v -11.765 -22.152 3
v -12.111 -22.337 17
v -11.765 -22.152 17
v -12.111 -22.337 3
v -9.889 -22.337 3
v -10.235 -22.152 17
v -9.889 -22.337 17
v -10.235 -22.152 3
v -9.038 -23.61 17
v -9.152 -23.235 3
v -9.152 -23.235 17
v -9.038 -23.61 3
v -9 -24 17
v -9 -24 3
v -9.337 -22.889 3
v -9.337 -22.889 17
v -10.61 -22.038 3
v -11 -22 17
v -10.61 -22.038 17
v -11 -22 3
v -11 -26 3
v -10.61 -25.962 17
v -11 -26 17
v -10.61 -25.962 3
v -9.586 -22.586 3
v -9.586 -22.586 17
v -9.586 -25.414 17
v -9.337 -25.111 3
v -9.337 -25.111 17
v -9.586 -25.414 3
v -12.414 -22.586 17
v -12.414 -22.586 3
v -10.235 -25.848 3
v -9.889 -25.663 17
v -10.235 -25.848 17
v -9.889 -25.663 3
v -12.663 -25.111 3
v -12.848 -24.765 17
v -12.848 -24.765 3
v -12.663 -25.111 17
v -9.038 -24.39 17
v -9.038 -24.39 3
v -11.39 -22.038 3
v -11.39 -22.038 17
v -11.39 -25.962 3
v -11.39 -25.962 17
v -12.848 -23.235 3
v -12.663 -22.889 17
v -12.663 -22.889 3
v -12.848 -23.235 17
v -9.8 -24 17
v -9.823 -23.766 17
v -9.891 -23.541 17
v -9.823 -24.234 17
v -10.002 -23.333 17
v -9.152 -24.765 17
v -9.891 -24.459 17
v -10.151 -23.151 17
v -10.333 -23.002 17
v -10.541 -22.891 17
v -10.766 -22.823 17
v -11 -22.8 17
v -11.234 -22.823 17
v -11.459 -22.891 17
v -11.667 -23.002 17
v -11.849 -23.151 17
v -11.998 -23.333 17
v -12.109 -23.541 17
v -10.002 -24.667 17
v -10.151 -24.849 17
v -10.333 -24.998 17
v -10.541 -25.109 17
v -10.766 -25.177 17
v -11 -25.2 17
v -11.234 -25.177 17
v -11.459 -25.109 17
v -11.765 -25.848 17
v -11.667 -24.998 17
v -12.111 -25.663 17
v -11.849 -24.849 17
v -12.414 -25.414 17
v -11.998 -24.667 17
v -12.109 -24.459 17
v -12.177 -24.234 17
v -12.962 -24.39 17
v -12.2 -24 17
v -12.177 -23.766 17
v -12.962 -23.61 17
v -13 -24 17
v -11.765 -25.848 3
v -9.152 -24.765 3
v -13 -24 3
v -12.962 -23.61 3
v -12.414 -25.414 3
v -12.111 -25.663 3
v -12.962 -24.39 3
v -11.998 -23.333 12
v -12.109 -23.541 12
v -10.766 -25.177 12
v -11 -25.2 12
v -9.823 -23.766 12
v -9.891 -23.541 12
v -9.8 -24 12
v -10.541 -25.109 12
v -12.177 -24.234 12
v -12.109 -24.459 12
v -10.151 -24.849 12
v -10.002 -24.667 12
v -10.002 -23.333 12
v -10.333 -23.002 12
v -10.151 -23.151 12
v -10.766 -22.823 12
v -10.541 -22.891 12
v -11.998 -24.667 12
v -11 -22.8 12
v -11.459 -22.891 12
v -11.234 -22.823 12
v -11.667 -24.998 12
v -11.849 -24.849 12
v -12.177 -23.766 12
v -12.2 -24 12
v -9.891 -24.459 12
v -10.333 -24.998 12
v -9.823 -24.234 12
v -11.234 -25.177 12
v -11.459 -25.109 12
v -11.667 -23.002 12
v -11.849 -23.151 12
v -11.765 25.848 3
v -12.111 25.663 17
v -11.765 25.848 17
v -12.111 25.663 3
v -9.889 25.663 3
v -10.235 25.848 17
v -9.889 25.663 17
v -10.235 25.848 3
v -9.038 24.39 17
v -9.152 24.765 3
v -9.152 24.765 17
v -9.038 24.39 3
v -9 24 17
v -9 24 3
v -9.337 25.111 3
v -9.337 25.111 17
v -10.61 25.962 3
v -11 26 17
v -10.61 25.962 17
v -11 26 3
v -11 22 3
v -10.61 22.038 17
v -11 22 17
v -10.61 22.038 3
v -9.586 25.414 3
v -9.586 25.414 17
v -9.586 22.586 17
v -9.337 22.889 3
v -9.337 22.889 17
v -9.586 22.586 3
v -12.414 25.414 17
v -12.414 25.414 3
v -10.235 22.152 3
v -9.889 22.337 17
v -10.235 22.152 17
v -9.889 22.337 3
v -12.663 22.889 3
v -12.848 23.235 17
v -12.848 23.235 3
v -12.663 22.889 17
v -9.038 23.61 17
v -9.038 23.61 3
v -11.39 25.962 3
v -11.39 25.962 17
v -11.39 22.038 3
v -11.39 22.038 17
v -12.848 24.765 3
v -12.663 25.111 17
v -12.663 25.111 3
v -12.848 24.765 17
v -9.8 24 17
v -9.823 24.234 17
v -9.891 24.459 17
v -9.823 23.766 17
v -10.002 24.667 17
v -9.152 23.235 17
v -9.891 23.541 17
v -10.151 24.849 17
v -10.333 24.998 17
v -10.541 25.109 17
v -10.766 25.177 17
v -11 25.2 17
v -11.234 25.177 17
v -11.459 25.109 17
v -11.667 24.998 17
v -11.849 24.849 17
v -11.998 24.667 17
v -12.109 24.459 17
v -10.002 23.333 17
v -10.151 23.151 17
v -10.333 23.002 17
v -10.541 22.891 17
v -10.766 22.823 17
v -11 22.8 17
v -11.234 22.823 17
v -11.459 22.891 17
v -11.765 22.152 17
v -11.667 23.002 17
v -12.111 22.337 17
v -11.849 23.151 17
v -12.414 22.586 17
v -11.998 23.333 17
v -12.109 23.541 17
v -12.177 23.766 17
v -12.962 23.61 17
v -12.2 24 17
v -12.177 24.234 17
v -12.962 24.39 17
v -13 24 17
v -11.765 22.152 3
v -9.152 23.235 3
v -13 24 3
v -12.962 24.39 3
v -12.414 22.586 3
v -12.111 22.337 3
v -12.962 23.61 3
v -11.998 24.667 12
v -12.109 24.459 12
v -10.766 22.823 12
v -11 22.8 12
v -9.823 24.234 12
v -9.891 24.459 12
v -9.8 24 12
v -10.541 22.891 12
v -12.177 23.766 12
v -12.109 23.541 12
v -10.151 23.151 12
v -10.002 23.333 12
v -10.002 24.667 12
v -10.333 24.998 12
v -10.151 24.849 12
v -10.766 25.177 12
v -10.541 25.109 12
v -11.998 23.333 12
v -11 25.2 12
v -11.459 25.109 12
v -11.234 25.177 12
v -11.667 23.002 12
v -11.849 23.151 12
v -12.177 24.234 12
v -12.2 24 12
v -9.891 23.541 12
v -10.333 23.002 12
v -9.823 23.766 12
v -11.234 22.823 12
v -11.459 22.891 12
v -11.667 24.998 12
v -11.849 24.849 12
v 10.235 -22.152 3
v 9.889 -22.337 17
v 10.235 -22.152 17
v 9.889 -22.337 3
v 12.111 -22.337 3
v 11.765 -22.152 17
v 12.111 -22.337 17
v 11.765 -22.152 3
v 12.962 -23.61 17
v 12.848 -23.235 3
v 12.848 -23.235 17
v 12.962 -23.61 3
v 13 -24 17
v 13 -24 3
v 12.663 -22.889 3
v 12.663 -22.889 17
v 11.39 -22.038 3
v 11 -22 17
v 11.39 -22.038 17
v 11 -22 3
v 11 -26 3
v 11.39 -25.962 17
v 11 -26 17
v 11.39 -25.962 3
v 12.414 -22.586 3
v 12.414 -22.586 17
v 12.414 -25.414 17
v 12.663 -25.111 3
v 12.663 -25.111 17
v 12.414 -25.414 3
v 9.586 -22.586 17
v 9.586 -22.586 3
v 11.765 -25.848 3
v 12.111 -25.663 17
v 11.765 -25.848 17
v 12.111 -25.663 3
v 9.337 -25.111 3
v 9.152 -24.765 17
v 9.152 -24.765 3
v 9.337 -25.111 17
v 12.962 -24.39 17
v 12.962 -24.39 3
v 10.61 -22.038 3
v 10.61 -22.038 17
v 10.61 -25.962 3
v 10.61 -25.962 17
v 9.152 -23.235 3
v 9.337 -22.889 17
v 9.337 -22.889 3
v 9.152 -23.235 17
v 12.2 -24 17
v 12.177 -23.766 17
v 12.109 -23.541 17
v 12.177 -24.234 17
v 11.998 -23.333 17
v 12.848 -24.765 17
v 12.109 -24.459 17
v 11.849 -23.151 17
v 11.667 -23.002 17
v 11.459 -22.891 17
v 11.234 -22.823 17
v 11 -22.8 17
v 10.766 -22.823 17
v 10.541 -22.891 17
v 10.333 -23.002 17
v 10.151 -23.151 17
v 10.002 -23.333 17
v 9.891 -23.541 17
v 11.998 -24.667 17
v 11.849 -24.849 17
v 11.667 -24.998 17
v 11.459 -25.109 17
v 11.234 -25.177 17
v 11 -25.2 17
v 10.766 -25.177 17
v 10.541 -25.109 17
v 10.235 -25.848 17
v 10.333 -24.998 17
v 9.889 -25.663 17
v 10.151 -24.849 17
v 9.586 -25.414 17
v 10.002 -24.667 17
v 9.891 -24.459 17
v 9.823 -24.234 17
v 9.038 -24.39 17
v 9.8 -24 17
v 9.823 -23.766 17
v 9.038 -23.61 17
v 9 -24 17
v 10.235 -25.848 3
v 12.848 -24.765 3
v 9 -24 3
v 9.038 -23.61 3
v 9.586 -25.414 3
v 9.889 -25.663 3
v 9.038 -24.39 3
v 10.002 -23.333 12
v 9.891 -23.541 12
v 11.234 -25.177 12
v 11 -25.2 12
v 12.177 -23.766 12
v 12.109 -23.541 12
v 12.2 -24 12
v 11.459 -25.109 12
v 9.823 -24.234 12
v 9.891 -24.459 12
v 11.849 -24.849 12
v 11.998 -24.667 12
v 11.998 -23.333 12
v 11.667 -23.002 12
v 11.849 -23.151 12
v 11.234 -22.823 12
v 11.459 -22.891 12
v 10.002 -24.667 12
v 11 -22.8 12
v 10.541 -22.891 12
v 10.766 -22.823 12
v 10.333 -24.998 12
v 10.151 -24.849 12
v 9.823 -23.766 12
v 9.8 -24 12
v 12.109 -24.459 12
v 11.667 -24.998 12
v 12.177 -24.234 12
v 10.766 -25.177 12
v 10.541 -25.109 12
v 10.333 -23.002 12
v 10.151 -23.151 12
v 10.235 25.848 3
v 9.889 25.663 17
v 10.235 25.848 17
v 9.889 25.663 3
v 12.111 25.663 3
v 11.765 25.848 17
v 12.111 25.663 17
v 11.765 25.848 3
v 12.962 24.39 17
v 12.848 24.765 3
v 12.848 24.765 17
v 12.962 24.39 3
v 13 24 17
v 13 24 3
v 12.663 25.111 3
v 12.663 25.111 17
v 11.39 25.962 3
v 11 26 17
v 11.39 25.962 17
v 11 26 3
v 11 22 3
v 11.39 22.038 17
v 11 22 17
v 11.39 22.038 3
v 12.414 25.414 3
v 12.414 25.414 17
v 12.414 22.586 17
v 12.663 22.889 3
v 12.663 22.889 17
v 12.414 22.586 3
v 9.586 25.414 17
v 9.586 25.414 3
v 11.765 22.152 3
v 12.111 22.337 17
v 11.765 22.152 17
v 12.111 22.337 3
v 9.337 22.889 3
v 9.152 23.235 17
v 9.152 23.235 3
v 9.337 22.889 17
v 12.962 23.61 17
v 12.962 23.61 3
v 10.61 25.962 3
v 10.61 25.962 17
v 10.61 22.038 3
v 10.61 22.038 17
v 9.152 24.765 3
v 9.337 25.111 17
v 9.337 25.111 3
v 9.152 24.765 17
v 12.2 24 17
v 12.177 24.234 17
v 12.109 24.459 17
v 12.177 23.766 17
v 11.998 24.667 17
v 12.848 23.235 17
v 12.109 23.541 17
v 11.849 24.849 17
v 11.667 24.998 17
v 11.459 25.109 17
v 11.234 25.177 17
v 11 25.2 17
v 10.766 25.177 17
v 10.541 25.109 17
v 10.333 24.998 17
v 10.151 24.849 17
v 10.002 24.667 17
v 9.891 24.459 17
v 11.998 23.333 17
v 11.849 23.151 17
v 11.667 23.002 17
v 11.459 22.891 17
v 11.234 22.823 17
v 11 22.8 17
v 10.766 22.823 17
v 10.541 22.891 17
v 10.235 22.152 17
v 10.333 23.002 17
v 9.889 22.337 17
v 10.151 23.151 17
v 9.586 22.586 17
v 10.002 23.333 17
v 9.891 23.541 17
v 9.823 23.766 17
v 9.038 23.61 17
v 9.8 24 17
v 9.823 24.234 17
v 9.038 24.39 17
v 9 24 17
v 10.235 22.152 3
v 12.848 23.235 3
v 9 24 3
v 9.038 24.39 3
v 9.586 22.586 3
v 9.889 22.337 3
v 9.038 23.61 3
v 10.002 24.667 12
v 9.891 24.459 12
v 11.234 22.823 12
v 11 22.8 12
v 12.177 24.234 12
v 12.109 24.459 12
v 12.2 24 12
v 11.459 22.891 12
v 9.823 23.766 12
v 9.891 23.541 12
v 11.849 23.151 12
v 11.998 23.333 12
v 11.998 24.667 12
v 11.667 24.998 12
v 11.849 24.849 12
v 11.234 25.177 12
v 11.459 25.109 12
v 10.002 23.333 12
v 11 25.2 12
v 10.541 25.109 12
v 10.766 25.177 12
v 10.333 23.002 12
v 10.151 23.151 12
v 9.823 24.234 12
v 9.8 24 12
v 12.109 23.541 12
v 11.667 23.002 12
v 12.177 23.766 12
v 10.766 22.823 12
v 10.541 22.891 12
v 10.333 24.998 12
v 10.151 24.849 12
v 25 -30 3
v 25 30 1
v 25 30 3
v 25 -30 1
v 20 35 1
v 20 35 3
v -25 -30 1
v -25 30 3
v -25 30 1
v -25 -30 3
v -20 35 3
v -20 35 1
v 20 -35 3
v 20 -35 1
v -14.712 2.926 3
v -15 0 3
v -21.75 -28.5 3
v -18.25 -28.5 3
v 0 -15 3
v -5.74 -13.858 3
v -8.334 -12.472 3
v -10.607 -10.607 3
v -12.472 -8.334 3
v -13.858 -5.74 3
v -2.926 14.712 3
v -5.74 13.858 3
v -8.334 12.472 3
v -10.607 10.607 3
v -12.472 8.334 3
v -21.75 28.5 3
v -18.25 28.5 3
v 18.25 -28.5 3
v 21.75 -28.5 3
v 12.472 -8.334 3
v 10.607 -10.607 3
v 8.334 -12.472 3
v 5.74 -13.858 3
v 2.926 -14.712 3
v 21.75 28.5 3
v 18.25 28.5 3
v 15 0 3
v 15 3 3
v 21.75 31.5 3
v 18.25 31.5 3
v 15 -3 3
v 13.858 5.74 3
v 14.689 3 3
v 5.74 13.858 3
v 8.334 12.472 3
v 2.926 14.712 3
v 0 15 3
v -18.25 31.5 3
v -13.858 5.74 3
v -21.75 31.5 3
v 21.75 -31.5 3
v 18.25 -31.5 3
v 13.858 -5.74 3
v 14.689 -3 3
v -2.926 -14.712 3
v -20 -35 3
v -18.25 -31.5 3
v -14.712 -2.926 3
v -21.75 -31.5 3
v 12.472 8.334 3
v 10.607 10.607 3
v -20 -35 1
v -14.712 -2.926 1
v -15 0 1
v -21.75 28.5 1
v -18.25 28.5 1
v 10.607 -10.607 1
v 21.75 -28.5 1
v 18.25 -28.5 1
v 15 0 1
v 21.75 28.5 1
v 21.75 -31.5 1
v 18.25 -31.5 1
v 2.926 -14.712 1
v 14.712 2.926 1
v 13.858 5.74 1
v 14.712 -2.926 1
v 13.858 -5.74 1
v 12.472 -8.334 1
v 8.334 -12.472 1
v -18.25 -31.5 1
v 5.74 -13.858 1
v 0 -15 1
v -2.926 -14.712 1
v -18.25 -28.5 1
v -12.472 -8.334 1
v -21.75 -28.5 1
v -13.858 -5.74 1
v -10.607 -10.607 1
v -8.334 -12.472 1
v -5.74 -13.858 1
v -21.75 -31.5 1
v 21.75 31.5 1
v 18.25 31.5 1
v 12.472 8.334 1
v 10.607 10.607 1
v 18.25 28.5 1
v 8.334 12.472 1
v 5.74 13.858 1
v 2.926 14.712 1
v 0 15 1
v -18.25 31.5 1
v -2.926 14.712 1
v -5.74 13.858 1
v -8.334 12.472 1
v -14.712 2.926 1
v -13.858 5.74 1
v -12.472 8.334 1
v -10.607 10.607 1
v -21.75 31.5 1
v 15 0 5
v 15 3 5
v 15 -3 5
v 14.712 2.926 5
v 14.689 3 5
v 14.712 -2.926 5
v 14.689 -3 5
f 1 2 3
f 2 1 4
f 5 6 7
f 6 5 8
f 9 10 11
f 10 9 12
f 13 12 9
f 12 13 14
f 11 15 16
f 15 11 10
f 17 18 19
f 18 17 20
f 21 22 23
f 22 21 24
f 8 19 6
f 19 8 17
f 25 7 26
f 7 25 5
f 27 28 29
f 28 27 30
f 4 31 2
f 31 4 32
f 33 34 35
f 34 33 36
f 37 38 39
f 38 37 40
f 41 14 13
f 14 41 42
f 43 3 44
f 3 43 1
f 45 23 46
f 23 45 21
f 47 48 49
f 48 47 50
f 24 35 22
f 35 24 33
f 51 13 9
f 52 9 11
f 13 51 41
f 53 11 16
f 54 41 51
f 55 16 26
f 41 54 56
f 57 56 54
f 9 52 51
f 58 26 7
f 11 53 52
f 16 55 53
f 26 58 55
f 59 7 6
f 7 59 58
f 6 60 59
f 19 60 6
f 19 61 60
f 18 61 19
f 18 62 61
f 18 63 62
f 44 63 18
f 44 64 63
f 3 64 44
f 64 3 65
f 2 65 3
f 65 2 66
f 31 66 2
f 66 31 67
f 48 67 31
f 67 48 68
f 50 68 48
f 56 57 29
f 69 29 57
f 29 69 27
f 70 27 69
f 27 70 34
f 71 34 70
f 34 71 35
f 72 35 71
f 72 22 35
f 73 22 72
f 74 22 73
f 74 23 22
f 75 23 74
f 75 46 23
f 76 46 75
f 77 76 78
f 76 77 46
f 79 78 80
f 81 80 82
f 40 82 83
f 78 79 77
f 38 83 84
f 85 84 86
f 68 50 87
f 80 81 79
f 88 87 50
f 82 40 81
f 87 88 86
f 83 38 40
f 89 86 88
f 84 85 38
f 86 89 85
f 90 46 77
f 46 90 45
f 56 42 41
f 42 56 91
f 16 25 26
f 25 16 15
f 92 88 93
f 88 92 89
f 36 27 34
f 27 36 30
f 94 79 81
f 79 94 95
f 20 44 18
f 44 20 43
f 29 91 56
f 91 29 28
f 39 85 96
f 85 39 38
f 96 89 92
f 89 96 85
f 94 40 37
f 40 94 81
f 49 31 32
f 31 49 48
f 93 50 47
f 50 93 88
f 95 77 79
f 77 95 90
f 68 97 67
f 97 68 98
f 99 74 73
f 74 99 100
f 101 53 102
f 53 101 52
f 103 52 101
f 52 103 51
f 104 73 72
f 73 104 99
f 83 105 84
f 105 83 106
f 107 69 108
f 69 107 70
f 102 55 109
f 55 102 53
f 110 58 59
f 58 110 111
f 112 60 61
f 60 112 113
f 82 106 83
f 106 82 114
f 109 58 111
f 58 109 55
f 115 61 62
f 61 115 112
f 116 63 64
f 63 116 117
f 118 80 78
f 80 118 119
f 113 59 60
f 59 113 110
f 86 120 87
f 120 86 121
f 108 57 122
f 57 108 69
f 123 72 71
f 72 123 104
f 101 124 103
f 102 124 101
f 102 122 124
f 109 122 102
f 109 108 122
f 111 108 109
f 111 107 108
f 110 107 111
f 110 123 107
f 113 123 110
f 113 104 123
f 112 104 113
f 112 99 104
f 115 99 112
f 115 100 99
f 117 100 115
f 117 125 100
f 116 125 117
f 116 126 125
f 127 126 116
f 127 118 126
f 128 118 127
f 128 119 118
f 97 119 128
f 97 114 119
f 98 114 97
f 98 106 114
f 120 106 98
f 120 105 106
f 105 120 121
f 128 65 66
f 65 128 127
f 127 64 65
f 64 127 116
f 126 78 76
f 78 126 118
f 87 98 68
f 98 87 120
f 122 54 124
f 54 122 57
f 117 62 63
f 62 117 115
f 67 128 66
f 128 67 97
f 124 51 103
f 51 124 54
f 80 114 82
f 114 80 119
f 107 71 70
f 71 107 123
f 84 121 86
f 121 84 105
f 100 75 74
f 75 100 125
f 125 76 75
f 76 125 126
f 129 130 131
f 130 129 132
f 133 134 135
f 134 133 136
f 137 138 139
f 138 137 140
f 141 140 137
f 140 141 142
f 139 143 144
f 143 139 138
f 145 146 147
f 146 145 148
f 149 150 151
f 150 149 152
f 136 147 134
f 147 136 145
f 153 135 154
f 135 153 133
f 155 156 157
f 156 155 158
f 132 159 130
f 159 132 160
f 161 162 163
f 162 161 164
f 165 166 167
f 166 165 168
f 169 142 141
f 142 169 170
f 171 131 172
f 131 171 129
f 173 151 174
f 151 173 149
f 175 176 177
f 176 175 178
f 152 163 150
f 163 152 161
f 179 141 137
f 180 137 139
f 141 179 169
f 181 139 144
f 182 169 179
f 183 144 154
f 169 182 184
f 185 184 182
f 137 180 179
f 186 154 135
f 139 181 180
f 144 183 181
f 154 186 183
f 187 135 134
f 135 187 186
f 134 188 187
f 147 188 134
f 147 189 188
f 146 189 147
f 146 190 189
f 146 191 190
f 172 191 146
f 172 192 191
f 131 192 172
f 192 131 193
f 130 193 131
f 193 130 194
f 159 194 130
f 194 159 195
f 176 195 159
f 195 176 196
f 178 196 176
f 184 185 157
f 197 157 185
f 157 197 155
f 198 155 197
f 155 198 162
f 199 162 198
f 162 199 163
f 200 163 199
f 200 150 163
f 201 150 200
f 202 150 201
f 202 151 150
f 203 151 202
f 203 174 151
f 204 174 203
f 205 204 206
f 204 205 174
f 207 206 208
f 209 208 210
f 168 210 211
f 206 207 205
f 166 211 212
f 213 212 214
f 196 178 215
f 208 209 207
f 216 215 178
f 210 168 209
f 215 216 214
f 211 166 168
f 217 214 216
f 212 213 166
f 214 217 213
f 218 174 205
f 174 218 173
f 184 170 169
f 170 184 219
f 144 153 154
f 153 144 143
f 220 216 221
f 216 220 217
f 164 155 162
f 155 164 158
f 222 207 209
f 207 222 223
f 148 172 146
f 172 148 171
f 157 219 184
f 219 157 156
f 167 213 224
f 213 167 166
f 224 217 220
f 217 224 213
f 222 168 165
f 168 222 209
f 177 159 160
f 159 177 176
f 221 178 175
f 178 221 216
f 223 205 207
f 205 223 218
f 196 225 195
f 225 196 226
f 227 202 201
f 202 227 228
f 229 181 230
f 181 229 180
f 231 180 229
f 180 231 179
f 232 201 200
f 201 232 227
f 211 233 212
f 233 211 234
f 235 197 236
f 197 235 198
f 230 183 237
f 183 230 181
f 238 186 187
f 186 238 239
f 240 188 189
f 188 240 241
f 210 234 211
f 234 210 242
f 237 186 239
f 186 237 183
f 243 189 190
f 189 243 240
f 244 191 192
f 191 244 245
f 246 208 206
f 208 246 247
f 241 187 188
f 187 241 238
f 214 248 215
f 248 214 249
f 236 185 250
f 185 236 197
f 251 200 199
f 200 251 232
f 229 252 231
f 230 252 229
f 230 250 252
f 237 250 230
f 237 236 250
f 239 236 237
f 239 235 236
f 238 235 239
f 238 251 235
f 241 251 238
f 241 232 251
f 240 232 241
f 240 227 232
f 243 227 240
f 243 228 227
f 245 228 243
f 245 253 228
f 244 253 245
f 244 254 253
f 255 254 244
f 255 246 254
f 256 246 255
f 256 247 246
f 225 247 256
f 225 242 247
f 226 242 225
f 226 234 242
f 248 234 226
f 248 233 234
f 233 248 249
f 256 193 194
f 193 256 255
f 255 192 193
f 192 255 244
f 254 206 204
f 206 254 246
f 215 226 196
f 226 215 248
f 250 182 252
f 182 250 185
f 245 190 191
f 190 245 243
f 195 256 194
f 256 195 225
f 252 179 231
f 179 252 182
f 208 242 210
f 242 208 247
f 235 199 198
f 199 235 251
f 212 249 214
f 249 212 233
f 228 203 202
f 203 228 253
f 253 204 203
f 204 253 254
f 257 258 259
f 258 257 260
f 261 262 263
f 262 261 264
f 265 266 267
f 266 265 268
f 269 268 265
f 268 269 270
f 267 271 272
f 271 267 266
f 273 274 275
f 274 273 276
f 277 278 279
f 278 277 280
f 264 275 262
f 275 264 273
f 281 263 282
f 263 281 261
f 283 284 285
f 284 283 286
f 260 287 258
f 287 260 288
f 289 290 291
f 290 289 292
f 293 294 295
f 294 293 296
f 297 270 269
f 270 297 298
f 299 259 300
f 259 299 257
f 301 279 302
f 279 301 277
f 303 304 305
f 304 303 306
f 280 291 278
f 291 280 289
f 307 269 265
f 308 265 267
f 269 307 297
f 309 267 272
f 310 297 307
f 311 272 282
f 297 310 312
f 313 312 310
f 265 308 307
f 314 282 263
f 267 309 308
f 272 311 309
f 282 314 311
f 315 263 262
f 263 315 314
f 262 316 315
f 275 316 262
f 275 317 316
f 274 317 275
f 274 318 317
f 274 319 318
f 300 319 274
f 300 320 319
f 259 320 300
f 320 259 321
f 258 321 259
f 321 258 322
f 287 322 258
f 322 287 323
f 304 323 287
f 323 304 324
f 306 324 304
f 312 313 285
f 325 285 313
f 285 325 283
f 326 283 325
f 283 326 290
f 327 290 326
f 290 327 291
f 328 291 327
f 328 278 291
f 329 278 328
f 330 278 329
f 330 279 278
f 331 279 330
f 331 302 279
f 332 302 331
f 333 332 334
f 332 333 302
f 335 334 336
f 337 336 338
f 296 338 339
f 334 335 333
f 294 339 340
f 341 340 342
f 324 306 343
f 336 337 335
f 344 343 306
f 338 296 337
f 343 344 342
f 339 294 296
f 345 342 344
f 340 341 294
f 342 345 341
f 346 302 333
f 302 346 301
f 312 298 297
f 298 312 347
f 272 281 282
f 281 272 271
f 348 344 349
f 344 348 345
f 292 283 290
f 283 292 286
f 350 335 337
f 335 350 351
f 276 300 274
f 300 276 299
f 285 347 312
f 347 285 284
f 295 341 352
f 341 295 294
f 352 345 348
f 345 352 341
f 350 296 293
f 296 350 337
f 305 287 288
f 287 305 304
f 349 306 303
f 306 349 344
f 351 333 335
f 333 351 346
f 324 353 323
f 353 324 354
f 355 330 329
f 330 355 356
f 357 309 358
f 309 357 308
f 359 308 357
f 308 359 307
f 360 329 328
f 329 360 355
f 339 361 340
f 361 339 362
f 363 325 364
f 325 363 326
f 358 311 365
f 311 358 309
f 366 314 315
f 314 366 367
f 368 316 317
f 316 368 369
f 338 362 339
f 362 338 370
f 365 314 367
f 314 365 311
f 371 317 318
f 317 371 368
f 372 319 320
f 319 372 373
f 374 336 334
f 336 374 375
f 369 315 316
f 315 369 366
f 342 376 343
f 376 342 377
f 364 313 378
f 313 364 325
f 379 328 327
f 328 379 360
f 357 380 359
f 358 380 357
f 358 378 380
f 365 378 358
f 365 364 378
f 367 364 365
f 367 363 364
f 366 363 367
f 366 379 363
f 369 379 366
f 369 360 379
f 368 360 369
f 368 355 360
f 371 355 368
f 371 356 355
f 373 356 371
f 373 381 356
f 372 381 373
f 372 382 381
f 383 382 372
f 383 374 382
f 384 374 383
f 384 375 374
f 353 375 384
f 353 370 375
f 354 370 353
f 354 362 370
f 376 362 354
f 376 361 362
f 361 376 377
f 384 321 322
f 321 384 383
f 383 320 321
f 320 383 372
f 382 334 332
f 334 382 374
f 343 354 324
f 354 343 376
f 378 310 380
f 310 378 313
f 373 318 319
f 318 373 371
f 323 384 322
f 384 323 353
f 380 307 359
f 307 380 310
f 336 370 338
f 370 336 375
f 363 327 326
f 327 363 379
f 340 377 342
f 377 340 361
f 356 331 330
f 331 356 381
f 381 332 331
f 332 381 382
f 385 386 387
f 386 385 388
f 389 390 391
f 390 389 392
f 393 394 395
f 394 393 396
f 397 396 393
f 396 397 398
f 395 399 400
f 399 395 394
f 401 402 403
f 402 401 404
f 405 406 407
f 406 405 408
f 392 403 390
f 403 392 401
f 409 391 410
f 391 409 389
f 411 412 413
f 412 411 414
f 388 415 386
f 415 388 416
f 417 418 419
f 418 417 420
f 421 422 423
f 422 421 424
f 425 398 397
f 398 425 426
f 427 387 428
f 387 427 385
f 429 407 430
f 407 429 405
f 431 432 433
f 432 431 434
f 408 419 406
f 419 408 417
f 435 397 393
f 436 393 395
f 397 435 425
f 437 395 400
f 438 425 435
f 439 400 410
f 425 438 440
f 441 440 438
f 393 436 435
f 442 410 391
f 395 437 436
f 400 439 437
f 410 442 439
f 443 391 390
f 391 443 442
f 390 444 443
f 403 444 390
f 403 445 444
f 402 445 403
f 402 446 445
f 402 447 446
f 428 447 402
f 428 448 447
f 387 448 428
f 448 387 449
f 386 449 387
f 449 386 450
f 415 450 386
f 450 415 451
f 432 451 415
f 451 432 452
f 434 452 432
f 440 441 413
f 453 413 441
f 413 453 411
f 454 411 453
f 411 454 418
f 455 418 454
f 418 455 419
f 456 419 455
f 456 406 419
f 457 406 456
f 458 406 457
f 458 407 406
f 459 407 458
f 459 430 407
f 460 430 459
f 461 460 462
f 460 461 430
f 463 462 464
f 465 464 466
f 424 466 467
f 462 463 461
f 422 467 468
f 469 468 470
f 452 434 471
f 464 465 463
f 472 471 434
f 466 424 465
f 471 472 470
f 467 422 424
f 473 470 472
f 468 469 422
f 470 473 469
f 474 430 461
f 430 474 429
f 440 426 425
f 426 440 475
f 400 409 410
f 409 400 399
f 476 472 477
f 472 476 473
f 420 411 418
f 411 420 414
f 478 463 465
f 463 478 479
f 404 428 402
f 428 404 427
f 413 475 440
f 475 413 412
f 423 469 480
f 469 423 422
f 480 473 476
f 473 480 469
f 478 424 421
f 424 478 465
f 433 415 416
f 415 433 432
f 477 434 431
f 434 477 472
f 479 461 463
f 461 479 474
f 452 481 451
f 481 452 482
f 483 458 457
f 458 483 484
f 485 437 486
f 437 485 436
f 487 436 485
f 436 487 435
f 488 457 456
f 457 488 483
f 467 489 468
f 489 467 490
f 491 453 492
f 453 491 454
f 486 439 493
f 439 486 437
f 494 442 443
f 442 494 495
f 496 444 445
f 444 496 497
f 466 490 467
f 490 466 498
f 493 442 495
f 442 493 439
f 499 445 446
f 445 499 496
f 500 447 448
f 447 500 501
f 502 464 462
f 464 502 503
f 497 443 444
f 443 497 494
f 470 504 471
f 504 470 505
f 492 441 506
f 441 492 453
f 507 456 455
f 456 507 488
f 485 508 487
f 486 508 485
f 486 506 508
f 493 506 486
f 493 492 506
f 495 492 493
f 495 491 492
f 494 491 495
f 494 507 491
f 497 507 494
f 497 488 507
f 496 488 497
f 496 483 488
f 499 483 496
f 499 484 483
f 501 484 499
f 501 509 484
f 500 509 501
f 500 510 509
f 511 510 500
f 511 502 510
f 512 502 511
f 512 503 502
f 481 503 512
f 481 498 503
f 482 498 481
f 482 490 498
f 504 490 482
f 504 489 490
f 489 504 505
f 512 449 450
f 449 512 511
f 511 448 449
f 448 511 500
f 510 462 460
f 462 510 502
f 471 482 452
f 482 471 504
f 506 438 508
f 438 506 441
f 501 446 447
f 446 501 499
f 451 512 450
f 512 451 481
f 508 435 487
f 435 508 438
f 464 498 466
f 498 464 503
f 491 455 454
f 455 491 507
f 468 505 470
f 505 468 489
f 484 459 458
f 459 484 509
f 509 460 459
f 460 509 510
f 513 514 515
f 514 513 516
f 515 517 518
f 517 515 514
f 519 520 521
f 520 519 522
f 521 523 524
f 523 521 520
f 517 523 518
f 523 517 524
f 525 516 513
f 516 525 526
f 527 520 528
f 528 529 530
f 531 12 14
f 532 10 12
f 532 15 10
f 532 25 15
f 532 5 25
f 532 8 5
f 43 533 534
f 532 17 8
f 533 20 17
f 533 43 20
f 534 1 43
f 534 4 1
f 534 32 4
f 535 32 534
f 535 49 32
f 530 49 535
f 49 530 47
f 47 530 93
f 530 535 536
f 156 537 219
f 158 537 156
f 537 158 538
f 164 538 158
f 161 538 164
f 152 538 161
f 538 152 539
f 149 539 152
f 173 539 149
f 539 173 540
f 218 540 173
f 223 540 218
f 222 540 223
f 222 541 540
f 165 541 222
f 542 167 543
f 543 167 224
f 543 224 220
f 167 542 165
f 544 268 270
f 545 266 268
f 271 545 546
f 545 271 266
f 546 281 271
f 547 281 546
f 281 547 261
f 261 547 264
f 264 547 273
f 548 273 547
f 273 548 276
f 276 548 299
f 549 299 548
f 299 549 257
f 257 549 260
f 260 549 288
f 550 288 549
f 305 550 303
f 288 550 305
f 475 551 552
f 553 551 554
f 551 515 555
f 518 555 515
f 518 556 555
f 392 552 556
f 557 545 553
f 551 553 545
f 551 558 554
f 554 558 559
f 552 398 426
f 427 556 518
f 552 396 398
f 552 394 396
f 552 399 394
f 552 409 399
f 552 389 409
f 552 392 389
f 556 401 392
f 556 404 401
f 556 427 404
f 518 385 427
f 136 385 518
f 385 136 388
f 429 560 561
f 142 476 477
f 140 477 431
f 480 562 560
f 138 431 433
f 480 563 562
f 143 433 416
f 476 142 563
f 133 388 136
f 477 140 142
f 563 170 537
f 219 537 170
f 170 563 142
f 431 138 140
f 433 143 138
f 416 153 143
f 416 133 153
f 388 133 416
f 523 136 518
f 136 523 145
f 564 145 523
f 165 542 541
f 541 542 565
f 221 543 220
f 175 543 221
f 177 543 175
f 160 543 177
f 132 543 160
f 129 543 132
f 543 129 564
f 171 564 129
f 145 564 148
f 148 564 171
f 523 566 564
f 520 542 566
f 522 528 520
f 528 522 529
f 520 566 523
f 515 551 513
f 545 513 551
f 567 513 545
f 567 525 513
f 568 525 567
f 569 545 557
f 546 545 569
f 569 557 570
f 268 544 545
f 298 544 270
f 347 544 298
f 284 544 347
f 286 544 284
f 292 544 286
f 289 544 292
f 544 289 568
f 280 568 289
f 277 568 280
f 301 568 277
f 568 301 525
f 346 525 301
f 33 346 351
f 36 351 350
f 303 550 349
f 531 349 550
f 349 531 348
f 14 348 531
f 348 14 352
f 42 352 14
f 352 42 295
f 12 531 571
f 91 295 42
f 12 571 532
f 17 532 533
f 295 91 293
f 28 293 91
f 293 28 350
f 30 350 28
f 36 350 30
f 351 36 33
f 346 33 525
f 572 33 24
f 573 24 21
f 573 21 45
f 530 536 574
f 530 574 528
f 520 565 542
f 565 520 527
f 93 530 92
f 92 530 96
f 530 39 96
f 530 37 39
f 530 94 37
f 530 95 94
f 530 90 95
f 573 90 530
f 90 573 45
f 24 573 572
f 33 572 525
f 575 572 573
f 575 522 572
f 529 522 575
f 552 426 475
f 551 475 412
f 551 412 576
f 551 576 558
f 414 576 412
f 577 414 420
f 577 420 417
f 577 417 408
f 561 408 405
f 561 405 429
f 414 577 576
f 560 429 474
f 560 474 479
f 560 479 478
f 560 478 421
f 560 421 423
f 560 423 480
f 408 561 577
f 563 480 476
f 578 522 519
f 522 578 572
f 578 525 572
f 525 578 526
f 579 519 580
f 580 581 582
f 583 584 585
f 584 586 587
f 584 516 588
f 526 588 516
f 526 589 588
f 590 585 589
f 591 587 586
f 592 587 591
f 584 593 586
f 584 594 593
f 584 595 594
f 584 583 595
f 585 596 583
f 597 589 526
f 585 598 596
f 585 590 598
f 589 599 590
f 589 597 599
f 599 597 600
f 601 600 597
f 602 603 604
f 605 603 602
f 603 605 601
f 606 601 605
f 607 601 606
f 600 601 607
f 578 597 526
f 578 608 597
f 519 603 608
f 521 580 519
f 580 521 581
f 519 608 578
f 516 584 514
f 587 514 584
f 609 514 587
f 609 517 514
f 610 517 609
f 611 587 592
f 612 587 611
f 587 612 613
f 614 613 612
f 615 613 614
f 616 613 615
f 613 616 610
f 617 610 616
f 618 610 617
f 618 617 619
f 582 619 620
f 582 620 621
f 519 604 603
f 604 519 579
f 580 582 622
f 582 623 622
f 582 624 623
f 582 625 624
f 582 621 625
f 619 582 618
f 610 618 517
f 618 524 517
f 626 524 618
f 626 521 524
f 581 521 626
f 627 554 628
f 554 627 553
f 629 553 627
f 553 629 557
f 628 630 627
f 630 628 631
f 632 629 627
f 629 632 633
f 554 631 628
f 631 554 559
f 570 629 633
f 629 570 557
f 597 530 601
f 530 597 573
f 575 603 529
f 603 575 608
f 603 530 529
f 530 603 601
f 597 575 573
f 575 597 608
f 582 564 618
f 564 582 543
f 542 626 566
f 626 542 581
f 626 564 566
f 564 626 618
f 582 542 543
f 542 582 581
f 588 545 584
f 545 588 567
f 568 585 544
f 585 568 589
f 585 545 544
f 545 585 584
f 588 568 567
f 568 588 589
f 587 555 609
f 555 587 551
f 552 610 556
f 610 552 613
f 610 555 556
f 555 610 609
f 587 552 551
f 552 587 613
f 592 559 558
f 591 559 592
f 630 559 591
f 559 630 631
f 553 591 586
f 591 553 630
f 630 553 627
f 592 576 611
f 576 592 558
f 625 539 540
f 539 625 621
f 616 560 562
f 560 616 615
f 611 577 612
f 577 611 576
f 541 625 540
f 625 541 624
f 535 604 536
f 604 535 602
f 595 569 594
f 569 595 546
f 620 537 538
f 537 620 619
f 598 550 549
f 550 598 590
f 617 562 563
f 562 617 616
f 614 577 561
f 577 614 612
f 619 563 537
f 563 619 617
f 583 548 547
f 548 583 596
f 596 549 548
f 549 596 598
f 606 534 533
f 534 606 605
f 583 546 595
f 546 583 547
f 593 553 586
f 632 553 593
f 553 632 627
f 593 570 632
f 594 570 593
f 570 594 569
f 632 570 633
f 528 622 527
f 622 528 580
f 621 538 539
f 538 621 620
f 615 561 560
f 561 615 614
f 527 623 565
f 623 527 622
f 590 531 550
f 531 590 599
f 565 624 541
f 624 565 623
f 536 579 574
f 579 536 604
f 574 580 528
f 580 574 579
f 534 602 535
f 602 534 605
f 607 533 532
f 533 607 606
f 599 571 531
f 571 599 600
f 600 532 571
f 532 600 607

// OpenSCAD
// ==========================================
// Xentient Interior — Zone C Plate (ESP32-WROOM-32)
// Mounts ESP32 dev board at Z=45
// ==========================================
// Print count: 1
// Mount: slides into rail guides at Z=45, or rests on glued M2 standoffs
// Per Framework §7: ESP32 mount + anti-rotation nub + wire chimney
// Units: mm

$fn = 32;

ESP_BoardL  = 55.0;
ESP_BoardW  = 28.0;
ESP_SoX     = 22.0;
ESP_SoY     = 48.0;

M2_Hole     = 2.4;
M2_Boss     = 4.0;
Plate_T     = 2.0;
Wire_Chimney_D = 30.0;
Slot_W      = 3.5;
Slot_Engage = 2.0;

module zone_c_plate() {
    difference() {
        union() {
            // Main plate (fits hex at Z=45, F2F≈106mm)
            translate([0, 0, Plate_T/2])
                hull() {
                    for (sx = [-1, 1], sy = [-1, 1]) {
                        translate([sx * 20, sy * 30, 0])
                            cylinder(h=Plate_T, r=5, $fn=4);
                    }
                }

            // 4× M2 standoff pillars
            for (sx = [-1, 1], sy = [-1, 1]) {
                translate([sx * ESP_SoX/2, sy * ESP_SoY/2, Plate_T])
                    difference() {
                        cylinder(h=15, d=M2_Boss, $fn=32);
                        translate([0, 0, 10])
                            cylinder(h=6, d=M2_Hole, $fn=32);
                    }
            }

            // Anti-rotation nub
            translate([ESP_SoX/2 + 2, -3, Plate_T])
                cube([2, 6, 3]);
        }

        // Wire chimney
        translate([0, 0, -1])
            cylinder(h=40, d=Wire_Chimney_D, $fn=32);

        // Rail engagement notches
        for (sx = [-1, 1], sy = [-1, 1]) {
            translate([sx * 20, sy * 30, Plate_T])
                cube([Slot_W, 3.0, Slot_Engage + 1], center=true);
        }
    }
}

// Render
zone_c_plate();
